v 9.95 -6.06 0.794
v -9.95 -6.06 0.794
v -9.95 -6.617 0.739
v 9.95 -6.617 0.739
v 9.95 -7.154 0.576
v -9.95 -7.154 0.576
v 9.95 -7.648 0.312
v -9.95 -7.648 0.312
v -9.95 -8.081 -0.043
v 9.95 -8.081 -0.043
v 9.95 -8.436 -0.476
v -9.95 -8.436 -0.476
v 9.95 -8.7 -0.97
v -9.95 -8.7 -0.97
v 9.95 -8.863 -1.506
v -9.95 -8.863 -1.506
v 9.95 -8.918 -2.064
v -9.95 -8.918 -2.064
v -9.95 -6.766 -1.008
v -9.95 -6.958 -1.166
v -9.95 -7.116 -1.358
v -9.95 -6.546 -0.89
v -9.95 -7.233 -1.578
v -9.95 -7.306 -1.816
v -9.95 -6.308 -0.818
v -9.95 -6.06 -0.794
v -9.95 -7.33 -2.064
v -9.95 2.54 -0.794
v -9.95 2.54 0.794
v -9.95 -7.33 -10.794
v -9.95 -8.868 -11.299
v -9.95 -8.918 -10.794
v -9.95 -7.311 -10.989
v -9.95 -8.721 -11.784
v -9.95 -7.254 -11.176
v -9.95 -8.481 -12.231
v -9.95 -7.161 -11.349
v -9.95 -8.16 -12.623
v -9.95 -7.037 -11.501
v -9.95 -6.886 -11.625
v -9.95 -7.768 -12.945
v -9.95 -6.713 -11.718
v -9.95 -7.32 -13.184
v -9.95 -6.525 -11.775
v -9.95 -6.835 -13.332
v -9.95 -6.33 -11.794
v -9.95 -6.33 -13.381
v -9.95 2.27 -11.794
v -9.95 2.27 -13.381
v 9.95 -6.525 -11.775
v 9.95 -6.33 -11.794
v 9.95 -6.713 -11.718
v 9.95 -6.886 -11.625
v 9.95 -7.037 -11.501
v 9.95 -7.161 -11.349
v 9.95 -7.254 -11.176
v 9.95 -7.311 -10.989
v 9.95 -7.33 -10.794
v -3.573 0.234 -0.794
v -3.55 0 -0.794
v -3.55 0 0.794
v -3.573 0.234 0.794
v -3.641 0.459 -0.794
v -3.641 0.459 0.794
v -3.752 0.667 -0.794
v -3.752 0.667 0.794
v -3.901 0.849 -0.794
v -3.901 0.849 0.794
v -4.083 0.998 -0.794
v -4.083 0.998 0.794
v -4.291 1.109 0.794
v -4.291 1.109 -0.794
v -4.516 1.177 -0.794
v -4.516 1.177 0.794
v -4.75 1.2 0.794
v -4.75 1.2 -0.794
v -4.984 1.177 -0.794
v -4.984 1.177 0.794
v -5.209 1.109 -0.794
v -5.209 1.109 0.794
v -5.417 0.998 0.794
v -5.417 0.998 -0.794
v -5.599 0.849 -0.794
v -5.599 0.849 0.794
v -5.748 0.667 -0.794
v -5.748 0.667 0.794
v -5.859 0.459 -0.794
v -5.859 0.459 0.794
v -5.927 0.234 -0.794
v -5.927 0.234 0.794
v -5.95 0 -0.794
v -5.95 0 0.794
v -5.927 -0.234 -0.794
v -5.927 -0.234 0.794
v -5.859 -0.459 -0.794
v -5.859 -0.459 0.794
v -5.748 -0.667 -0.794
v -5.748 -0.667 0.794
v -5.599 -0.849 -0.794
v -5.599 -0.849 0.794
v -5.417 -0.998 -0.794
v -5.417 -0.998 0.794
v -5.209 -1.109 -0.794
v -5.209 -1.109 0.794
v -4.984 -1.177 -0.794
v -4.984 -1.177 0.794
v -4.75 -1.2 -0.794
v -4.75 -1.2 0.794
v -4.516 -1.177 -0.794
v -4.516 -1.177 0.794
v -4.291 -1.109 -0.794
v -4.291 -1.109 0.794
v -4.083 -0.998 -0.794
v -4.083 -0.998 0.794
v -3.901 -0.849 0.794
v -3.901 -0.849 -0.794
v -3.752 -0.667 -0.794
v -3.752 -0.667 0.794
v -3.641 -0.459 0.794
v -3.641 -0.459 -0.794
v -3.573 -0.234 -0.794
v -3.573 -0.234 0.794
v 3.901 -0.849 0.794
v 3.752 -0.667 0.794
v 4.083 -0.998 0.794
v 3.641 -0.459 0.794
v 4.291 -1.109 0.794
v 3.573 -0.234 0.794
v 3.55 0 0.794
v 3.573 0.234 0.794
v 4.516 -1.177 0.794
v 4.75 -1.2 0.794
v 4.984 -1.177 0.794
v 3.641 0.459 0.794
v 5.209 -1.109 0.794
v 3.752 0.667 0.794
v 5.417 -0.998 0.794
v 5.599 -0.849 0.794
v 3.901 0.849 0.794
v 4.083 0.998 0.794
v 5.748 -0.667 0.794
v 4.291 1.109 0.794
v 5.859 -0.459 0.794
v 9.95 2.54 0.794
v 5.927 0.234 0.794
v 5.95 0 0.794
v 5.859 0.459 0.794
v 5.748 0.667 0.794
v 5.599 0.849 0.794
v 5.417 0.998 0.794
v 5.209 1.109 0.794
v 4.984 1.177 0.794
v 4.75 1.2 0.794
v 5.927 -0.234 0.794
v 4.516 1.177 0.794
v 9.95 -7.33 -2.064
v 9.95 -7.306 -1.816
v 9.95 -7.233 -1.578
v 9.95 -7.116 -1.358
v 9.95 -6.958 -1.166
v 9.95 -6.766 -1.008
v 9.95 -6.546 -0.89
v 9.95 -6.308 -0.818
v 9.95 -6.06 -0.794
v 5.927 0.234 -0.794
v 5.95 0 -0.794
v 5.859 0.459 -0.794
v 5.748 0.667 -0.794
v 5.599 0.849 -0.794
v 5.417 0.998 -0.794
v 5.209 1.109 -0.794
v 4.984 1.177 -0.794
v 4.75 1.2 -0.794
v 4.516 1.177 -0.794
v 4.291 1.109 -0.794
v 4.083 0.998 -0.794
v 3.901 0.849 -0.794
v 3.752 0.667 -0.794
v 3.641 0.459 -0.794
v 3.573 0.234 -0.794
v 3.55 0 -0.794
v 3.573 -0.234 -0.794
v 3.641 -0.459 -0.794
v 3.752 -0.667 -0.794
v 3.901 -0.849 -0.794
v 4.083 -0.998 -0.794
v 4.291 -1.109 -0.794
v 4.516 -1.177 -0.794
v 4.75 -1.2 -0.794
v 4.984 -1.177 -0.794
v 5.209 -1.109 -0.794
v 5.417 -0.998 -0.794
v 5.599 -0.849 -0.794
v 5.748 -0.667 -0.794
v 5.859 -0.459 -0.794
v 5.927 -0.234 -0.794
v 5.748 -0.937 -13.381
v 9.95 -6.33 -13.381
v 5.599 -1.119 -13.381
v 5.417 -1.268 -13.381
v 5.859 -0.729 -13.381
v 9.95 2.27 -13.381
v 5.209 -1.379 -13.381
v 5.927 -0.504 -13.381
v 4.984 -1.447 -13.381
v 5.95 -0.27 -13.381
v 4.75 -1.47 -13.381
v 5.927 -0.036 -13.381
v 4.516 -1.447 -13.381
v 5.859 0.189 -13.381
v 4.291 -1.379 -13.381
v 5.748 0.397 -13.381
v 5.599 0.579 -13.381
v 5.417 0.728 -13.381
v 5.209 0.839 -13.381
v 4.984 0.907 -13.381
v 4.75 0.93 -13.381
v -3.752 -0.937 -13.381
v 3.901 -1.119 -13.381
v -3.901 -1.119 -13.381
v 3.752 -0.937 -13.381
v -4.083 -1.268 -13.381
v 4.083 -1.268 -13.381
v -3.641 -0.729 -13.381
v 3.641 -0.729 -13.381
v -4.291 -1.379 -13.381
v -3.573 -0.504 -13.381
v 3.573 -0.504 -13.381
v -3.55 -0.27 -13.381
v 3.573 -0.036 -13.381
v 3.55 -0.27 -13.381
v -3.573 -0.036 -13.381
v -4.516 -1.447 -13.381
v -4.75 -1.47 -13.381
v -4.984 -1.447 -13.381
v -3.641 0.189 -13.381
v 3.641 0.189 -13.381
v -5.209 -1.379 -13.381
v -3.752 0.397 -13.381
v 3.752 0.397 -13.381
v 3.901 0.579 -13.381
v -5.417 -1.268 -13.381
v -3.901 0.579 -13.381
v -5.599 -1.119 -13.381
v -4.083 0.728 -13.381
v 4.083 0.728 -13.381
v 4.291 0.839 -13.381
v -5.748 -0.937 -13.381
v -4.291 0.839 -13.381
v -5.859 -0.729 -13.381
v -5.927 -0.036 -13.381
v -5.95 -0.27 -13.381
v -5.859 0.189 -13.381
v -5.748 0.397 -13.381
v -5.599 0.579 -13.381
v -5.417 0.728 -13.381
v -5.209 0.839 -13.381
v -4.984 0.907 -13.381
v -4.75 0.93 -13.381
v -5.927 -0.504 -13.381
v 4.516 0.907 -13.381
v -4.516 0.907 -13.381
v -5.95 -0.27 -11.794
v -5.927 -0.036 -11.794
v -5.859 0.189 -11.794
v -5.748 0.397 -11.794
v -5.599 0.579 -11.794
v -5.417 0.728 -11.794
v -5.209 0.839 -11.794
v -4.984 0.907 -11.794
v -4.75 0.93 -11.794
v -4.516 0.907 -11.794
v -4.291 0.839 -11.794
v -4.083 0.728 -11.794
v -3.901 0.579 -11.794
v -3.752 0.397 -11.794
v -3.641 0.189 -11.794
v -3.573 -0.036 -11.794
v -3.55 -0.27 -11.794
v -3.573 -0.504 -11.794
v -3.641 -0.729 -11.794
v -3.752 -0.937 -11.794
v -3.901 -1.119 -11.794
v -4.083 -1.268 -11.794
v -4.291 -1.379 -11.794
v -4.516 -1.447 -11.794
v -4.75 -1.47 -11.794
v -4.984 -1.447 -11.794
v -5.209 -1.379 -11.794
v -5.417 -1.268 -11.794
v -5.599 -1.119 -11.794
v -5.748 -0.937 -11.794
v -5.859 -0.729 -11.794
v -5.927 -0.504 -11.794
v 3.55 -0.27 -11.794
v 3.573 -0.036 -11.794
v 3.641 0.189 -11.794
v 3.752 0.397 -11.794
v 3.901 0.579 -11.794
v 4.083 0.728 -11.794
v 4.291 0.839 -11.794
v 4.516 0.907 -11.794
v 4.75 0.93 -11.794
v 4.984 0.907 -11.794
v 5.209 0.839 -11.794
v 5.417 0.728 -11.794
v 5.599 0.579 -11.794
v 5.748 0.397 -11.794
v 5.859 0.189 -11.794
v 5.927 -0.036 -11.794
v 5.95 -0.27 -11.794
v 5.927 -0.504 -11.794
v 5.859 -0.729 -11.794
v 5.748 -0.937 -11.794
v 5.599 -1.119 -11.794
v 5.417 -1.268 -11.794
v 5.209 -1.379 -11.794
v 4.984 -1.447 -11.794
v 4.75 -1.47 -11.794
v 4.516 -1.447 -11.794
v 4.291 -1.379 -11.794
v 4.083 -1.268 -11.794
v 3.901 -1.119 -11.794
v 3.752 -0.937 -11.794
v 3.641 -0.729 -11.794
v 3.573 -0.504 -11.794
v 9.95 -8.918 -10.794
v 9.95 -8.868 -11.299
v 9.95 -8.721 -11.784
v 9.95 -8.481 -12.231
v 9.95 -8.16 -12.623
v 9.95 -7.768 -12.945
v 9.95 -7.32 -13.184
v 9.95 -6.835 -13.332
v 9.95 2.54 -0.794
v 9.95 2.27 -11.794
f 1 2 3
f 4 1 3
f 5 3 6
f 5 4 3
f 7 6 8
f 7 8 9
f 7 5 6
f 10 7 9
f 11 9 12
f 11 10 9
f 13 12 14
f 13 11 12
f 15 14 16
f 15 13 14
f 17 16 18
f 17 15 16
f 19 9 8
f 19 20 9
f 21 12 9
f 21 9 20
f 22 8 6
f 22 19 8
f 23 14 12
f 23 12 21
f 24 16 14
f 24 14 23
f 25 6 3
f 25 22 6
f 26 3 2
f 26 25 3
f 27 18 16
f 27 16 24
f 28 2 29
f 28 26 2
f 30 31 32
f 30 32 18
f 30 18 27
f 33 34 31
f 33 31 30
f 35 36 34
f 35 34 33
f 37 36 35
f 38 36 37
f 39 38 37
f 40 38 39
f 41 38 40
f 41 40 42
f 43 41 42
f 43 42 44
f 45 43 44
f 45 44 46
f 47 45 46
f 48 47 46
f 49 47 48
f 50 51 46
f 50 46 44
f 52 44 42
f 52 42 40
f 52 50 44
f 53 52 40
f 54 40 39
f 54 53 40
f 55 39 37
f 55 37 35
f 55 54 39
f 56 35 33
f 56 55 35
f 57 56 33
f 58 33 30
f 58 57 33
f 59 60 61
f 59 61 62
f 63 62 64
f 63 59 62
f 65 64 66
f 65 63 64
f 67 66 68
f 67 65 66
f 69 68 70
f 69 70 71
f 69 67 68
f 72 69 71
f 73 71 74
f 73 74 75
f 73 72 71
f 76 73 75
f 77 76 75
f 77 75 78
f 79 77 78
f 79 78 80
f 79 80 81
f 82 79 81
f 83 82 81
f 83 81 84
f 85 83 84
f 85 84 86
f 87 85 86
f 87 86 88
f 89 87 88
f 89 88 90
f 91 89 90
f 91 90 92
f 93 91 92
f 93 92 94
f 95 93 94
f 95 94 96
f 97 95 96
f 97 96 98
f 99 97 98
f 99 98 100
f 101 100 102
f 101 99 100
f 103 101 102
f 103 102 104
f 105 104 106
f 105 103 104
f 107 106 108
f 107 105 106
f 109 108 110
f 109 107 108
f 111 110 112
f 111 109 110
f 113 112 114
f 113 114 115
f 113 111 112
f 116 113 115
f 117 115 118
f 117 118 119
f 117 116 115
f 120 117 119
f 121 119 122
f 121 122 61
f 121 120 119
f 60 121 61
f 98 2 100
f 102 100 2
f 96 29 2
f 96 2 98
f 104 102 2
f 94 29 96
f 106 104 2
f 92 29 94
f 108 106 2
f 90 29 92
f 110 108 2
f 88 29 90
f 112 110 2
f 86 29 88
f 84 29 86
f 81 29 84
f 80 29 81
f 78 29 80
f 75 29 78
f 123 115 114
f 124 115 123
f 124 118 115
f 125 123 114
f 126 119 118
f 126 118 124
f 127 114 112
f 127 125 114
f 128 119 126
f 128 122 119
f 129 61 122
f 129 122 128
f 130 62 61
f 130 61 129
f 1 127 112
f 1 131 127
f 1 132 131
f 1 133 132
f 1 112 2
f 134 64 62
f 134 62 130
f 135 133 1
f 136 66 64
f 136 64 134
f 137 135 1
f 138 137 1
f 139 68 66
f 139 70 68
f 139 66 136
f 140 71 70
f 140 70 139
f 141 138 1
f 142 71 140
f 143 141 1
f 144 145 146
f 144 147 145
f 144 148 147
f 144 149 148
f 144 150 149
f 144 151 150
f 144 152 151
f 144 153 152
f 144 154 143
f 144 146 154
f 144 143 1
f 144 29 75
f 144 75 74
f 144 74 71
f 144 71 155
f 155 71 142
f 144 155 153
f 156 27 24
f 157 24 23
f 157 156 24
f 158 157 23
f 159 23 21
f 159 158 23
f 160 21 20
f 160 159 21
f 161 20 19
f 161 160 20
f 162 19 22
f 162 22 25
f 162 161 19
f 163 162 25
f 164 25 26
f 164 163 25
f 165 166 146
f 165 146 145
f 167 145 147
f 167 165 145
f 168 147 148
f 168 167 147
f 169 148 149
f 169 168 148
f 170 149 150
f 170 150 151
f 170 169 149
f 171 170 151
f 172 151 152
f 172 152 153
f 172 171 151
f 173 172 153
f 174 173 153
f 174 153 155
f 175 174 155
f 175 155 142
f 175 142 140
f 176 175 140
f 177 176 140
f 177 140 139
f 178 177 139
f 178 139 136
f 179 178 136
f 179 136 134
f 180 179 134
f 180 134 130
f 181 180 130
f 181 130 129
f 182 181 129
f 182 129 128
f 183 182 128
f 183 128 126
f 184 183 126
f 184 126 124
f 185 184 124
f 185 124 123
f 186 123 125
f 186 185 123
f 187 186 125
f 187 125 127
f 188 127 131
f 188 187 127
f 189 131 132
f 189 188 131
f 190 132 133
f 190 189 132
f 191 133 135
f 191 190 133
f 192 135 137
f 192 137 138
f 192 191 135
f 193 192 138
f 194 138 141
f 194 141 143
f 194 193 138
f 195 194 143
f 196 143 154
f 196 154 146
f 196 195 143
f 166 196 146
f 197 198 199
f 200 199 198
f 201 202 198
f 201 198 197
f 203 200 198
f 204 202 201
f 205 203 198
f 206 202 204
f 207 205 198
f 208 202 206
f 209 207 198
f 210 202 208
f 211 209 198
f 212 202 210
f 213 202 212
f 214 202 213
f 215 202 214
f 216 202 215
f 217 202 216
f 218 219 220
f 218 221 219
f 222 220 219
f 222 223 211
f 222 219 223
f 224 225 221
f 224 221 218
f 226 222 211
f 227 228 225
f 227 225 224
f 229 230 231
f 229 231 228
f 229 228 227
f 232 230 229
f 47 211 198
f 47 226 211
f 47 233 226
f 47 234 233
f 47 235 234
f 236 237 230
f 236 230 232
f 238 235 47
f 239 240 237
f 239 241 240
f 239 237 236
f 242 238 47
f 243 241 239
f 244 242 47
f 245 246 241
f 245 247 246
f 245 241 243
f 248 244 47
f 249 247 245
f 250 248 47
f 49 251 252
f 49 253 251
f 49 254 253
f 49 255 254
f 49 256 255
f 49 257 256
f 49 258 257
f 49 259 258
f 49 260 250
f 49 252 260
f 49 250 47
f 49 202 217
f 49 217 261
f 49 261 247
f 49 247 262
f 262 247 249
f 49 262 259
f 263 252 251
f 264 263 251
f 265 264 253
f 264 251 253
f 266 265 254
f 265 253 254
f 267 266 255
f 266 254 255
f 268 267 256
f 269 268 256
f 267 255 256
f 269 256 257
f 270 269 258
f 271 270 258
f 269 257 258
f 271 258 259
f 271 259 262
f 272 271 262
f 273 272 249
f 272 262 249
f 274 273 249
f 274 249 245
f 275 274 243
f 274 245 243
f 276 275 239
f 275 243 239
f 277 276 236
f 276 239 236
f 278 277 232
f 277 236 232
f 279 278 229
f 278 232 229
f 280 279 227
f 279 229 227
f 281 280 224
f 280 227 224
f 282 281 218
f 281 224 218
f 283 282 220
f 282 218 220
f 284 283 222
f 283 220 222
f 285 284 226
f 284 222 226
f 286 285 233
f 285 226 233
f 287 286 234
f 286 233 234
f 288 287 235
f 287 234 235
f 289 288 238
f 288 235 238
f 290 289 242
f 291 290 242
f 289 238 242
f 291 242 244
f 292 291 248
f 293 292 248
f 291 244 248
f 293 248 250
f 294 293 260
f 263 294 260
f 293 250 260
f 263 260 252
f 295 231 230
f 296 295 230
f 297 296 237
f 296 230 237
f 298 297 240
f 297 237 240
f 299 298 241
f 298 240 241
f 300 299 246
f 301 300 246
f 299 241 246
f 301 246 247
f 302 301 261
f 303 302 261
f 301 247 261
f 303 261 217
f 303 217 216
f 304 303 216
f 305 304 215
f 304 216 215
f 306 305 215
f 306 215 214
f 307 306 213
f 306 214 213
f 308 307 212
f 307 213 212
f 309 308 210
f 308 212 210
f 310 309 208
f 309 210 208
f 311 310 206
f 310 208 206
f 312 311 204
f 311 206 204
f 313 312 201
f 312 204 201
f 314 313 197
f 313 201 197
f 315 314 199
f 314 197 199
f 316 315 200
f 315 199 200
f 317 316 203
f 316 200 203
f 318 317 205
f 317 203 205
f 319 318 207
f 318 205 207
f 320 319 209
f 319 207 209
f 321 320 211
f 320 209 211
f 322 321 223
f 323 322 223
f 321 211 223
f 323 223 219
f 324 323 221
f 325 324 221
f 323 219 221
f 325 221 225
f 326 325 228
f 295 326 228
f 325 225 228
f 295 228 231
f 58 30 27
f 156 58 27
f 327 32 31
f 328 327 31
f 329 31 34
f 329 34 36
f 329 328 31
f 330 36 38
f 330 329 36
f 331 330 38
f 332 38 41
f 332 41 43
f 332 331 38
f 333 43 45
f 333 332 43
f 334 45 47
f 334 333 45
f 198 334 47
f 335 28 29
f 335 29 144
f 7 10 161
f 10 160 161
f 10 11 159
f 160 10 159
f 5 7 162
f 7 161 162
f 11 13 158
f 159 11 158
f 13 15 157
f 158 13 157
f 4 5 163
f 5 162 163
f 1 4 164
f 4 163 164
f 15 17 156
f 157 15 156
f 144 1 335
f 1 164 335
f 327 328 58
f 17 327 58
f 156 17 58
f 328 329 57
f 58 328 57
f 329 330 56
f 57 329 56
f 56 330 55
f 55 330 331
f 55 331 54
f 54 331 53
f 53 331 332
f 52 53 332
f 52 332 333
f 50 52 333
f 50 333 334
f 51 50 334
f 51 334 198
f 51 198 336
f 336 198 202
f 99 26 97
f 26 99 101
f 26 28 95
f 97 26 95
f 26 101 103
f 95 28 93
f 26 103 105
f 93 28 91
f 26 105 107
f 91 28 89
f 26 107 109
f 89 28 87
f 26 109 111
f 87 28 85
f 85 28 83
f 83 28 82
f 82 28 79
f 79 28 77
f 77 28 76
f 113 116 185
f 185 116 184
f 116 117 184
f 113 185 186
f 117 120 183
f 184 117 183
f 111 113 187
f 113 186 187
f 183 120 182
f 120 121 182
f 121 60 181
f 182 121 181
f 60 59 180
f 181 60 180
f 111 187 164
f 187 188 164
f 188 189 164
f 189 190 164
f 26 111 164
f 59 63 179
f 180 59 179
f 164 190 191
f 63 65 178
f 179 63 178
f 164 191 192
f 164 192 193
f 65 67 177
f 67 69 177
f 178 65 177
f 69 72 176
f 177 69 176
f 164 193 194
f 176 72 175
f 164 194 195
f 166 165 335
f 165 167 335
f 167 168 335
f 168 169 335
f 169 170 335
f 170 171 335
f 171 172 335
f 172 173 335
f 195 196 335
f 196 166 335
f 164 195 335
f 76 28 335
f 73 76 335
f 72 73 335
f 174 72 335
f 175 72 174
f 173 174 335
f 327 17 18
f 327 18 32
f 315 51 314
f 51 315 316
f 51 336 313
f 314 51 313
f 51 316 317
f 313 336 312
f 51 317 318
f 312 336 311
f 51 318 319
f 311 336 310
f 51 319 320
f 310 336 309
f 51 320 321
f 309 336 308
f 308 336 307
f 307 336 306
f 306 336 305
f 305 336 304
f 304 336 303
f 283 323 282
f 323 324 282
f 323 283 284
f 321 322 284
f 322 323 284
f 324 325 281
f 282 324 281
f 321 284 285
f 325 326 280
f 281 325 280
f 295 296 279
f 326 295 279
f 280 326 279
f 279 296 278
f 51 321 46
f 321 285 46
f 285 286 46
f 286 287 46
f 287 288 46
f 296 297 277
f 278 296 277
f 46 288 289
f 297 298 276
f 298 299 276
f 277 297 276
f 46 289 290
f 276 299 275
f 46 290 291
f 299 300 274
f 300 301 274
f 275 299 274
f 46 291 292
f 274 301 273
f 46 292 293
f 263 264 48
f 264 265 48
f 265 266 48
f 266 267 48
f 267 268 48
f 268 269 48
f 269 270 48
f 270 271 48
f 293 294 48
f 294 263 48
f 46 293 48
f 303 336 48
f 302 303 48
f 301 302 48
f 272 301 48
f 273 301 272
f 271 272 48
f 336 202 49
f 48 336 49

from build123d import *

# Parameters (mm, degrees)
SKETCH1_W                = 19.9
SKETCH1_H                = 8.6
SKETCH1_R                = 1.2
BOSS_EXTRUDE1_DEPTH      = 0.79375
CONVERT_SOLID2_START     = -0.79375
CONVERT_SOLID2_OUTLINE_W = 19.9
CONVERT_SOLID2_OUTLINE_H = 8.6
CONVERT_SOLID2_OUTLINE_R = 1.2
CONVERT_SOLID2_DEPTH     = 0.79375
EDGE_FLANGE1_DEPTH       = 19.9
EDGE_FLANGE2_DEPTH       = 19.9
EDGE_FLANGE2_START       = 1.5875
EDGE_FLANGE2_PROFILE_W   = 19.9
EDGE_FLANGE2_PROFILE_H   = 8.6
EDGE_FLANGE2_PROFILE_R   = 1.2
EDGE_FLANGE2_FLAT_DEPTH  = 1.5875


# Read off the part's stored shape, not the designer's step: Convert-Solid2
# Sheet-metal steps are written as plain solids
with BuildPart() as part:
    # Sketch1 → Boss-Extrude1 (new body)
    with BuildSketch(Plane.XY):
        with Locations((0, -1.76)):
            Rectangle(SKETCH1_W, SKETCH1_H)
        with Locations((-4.75, 0)):
            Circle(SKETCH1_R, mode=Mode.SUBTRACT)
        with Locations((4.75, 0)):
            Circle(SKETCH1_R, mode=Mode.SUBTRACT)
    extrude(amount=BOSS_EXTRUDE1_DEPTH)

    # Convert-Solid2 outline → Convert-Solid2 (add)
    with BuildSketch(Plane.XY.offset(CONVERT_SOLID2_START)):
        with Locations((0, -1.76)):
            Rectangle(CONVERT_SOLID2_OUTLINE_W, CONVERT_SOLID2_OUTLINE_H)
        with Locations((-4.75, 0)):
            Circle(CONVERT_SOLID2_OUTLINE_R, mode=Mode.SUBTRACT)
        with Locations((4.75, 0)):
            Circle(CONVERT_SOLID2_OUTLINE_R, mode=Mode.SUBTRACT)
    extrude(amount=CONVERT_SOLID2_DEPTH)

    # Edge-Flange1 section (across the edge) → Edge-Flange1 (add)
    with BuildSketch(Plane(origin=(9.95, -7.33, -0.79375), x_dir=(0, 1, 0), z_dir=(-1, 0, 0))):
        with BuildLine():
            Line((-1.5875, 1.27), (-1.5875, 10))
            Line((-1.5875, 10), (0, 10))
            Line((0, 10), (0, 1.27))
            ThreePointArc((0, 1.27), (0.371974388, 0.371974388), (1.27, 0))
            Line((1.27, 0), (1.27, -1.5875))
            ThreePointArc((1.27, -1.5875), (-0.750557627, -0.750557627), (-1.5875, 1.27))
        make_face()
    extrude(amount=EDGE_FLANGE1_DEPTH)

    # Edge-Flange2 bend section (across the edge) → Edge-Flange2 (add)
    with BuildSketch(Plane(origin=(9.95, -7.33, -11.79375), x_dir=(0, 0, 1), z_dir=(-1, 0, 0))):
        with BuildLine():
            Line((-1.5875, 1), (0, 1))
            ThreePointArc((0, 1), (0.292893219, 0.292893219), (1, 0))
            Line((1, 0), (1, -1.5875))
            ThreePointArc((1, -1.5875), (-0.829638796, -0.829638796), (-1.5875, 1))
        make_face()
    extrude(amount=EDGE_FLANGE2_DEPTH)

    # Edge-Flange2 profile (on flange) → Edge-Flange2 flat (add)
    with BuildSketch(Plane(origin=(0, -7.33, -11.79375), x_dir=(-1, 0, 0), z_dir=(0, 0, -1)).offset(EDGE_FLANGE2_START)):
        with Locations((0, 5.3)):
            Rectangle(EDGE_FLANGE2_PROFILE_W, EDGE_FLANGE2_PROFILE_H)
        with Locations((-4.75, 7.06)):
            Circle(EDGE_FLANGE2_PROFILE_R, mode=Mode.SUBTRACT)
        with Locations((4.75, 7.06)):
            Circle(EDGE_FLANGE2_PROFILE_R, mode=Mode.SUBTRACT)
    extrude(amount=-EDGE_FLANGE2_FLAT_DEPTH)


solid = part.part
